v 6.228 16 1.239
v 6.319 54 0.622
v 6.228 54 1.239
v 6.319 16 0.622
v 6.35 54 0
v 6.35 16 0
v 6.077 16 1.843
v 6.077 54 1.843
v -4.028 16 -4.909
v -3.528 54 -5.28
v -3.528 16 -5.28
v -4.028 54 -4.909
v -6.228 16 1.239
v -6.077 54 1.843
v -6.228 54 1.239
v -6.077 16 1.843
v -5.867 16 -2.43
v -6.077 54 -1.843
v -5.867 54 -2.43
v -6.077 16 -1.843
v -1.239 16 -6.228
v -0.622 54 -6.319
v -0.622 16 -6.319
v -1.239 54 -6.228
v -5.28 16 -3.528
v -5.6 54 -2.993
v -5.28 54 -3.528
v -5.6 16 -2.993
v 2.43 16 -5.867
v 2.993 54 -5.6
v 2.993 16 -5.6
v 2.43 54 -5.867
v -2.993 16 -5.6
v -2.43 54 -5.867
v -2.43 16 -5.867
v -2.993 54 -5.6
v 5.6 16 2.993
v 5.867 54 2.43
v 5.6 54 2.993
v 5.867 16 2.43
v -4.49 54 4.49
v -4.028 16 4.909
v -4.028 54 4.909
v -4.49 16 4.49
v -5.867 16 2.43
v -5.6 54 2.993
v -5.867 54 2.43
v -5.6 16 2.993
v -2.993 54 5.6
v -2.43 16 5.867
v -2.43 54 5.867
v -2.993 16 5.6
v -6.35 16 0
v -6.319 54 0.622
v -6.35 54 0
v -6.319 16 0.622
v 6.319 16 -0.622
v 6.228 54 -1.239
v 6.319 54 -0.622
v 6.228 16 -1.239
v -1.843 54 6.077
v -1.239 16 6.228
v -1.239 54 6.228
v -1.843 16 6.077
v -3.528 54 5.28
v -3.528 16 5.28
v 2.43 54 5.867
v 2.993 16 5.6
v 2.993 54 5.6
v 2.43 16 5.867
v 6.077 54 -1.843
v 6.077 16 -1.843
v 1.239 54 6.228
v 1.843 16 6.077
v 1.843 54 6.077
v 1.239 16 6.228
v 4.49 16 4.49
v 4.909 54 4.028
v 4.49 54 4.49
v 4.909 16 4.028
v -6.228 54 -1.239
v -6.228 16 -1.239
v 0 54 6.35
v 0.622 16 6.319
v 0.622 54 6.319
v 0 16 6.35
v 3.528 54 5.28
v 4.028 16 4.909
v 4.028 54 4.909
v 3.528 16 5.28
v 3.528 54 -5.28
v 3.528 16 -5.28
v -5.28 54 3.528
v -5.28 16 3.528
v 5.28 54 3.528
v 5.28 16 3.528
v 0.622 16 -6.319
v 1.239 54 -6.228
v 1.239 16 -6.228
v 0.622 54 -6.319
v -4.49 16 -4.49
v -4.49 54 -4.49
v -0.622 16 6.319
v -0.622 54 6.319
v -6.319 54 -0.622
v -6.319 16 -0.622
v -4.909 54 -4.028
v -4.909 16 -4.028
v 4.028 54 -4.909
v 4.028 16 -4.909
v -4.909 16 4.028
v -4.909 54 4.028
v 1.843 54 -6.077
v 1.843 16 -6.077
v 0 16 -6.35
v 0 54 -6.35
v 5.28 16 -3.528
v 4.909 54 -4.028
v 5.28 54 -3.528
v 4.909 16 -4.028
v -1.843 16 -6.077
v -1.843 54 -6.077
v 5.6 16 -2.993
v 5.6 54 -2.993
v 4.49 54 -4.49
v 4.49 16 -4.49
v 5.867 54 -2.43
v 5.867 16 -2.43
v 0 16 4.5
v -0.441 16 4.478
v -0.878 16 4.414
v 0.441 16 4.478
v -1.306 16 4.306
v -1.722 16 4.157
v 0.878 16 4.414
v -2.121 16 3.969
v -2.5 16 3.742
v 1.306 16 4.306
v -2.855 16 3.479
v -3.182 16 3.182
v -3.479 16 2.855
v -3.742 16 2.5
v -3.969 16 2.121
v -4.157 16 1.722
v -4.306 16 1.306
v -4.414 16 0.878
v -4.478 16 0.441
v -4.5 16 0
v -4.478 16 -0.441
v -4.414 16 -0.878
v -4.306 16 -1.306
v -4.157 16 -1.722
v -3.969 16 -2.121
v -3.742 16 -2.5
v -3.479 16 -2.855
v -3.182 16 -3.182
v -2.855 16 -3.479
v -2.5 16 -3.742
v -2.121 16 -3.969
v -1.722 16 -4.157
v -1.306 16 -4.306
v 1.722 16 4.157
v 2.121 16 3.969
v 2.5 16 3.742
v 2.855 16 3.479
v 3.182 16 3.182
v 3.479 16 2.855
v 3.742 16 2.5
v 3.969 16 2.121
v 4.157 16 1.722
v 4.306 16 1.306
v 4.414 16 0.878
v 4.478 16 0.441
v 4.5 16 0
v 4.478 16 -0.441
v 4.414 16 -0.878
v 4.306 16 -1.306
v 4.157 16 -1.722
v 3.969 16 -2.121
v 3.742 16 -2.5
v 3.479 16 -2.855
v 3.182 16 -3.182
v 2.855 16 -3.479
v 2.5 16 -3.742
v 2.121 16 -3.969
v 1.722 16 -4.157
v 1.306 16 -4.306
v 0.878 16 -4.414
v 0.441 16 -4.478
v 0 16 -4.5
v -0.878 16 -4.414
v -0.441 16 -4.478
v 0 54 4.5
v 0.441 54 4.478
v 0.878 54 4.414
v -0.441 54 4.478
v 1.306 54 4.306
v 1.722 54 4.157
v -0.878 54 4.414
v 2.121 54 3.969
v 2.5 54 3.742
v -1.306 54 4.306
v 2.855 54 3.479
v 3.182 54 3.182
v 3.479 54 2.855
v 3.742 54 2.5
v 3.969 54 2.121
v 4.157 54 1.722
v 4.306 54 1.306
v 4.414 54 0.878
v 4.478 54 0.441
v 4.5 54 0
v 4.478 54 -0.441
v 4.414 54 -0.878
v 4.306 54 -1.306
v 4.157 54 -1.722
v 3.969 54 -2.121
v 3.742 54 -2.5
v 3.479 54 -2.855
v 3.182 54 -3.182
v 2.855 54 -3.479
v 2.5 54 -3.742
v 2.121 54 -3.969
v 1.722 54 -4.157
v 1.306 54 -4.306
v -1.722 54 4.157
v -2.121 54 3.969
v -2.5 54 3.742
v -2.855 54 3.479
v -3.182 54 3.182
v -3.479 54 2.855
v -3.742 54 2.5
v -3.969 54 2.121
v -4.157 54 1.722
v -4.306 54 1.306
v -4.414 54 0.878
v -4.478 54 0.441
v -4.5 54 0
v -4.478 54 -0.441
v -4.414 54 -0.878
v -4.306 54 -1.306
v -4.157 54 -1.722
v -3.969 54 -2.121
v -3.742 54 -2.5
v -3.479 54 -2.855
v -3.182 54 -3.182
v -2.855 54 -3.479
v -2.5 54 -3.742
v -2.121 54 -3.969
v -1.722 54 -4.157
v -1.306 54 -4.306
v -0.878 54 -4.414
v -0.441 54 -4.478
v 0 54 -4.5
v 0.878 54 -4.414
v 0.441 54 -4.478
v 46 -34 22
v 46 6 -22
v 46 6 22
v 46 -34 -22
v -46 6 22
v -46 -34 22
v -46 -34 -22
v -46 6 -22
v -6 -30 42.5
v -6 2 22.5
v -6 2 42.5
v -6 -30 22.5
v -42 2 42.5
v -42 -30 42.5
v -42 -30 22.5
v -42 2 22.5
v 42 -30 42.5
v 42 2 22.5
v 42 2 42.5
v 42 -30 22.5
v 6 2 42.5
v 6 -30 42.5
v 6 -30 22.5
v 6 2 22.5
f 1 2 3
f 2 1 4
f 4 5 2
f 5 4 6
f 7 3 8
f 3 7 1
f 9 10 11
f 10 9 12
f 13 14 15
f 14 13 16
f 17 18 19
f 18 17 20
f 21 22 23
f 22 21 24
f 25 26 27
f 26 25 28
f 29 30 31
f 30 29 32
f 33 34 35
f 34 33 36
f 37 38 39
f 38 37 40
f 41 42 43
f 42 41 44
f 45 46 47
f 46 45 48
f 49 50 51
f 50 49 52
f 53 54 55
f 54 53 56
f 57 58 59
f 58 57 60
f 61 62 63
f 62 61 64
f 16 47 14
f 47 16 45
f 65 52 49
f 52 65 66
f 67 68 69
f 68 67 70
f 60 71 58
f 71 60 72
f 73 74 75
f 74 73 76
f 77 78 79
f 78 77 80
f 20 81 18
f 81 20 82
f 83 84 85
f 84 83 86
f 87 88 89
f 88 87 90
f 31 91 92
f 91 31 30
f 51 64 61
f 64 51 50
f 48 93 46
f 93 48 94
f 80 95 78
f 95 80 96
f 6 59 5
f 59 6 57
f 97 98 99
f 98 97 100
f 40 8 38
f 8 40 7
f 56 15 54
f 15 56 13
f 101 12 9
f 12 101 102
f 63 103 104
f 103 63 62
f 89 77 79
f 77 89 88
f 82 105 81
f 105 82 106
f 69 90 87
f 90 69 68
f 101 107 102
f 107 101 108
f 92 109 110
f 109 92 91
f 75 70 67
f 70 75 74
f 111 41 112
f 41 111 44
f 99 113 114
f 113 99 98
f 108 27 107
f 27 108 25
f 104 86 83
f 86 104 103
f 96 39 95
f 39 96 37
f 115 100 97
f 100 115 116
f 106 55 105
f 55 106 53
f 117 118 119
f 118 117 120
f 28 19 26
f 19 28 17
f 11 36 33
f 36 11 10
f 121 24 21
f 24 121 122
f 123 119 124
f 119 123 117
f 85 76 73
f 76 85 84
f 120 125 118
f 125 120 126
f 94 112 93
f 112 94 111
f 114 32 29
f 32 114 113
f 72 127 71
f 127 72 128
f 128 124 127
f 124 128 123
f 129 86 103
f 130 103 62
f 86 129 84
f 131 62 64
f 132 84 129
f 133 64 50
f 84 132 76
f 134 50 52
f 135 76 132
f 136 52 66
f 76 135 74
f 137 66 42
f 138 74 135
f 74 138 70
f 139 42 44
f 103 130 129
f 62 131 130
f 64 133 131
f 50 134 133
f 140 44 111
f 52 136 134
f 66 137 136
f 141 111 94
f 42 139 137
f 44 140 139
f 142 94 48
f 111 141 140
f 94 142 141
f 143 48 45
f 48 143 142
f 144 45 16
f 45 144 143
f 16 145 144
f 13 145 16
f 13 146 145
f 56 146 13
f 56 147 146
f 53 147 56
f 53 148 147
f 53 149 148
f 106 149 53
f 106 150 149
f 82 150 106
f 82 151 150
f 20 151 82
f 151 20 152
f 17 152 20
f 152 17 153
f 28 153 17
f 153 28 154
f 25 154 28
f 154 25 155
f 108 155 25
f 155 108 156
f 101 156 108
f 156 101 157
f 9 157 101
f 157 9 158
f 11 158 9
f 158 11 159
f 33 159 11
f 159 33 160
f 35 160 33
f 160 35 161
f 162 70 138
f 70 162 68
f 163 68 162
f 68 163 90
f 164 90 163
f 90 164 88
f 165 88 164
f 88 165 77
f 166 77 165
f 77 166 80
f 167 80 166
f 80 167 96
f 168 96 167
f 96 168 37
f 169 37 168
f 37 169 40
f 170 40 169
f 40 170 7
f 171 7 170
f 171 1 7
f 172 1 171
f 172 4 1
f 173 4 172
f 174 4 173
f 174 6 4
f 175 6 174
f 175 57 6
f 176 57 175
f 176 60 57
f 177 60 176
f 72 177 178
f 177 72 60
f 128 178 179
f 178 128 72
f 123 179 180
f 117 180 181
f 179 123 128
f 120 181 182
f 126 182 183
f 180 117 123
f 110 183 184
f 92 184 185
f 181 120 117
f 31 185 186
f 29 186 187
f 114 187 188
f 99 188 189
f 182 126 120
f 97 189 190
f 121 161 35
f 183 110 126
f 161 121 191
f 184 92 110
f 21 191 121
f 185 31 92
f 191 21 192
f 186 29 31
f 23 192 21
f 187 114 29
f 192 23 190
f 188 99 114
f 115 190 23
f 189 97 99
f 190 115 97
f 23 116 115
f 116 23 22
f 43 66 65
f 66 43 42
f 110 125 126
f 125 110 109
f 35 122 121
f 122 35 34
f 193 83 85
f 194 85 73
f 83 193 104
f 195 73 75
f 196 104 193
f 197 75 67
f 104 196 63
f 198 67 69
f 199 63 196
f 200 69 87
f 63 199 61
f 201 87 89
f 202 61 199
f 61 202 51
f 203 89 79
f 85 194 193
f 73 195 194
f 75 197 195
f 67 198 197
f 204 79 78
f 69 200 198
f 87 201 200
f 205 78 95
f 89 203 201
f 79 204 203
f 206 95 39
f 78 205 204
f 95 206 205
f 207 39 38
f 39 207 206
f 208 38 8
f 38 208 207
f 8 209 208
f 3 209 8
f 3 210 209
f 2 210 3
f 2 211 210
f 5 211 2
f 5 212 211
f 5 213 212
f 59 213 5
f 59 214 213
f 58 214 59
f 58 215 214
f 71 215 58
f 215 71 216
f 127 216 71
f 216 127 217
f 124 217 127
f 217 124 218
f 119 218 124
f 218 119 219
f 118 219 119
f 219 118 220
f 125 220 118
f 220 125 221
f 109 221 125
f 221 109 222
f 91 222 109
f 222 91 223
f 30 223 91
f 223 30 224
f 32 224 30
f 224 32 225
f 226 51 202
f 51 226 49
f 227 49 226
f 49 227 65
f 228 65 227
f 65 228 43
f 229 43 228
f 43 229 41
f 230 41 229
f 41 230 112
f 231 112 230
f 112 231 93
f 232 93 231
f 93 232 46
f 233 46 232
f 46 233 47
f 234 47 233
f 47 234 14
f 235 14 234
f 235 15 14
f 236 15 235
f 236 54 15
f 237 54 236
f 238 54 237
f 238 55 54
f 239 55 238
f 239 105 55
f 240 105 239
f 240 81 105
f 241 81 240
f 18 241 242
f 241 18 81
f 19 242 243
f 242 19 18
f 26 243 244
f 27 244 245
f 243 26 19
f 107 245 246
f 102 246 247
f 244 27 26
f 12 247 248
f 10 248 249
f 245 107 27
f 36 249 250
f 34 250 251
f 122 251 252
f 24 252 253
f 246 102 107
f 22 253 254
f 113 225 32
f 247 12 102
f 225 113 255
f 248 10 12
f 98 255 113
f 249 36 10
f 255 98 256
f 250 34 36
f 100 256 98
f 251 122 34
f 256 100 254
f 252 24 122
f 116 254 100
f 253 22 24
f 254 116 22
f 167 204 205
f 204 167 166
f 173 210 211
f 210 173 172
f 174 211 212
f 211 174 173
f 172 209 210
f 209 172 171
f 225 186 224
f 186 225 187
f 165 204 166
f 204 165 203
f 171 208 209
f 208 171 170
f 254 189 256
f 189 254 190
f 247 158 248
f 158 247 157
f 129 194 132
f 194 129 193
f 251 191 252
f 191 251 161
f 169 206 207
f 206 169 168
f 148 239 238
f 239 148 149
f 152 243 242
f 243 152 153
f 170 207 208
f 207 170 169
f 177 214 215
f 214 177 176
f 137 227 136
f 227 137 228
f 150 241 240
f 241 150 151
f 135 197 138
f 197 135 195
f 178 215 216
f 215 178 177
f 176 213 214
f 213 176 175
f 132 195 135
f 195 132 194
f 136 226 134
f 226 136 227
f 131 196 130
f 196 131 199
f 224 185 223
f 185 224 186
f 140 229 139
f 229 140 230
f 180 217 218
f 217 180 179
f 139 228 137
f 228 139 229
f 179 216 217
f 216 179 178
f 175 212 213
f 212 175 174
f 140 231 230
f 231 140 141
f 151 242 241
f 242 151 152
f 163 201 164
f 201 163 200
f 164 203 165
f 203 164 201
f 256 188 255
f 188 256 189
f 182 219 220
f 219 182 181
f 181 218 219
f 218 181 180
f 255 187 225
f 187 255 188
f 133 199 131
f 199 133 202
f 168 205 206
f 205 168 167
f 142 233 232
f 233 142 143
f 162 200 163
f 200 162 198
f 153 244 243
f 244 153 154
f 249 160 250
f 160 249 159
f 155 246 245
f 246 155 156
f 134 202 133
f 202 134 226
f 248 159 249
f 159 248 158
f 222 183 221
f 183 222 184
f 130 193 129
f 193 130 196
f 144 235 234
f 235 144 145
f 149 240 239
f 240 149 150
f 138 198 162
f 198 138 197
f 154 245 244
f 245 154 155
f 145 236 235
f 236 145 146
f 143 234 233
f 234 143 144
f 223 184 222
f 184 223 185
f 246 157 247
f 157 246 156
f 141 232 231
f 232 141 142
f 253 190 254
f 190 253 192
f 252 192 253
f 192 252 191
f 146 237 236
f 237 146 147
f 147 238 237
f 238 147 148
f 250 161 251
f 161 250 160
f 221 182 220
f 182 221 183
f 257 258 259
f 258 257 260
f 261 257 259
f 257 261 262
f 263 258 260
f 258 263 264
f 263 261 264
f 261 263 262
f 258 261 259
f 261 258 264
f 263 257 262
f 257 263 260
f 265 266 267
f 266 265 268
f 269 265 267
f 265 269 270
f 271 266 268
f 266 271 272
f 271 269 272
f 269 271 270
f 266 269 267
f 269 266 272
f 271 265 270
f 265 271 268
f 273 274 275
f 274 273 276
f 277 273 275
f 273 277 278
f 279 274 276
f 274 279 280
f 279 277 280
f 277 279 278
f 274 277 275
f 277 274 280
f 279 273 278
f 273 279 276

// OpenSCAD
// ============================================================================
// Atom Lithography Machine — Parametric OpenSCAD Module (S1.1-04)
// ============================================================================
// part_id           : S1.1-04
// parent_bom_id     : S1.1
// subsystem         : S1
// part_name         : UHV VCR kutle akis denetleyici ve kaynak gaz manifoldu
// material          : 316L
// temp_stage        : 300 K
// vacuum_grade      : UHV 1e-9 mbar
// tolerance         : ±1% FS akis
// computed_mass_kg  : 1.67892
// envelope_mm       : 92.000 x 105.250 x 67.000
// design_maturity   : M0_M1_DETAILED_CAD_DESIGN_ONLY
// no_lab_measurement: true
// iec61508_certified: false
// semi_s2_certified : false
// Units: millimeters (mm)
// ============================================================================

$fn = 64;

// Nominal bounding envelope parameters (mm)
bbox_x = 92.0000;
bbox_y = 105.2500;
bbox_z = 67.0000;

// Part-specific parametric dimensions
manifold_w = 92.0;
manifold_d = 40.0;
vcr_od = 12.7;

// Interface / port parameters (mm)
port_vcr_out_to_source_od = 12.700;
port_vcr_out_to_source_bore = 9.000;
port_vcr_in_from_cabinet_od = 9.500;
port_vcr_in_from_cabinet_bore = 6.400;

module part_S1_1_04() {
  union() {
    // 316L VAR VCR manifold block
    translate([0.000, -14.000, 0.000]) cube([92.000, 40.000, 44.000], center=true);
    // PH3 0.1-10 sccm MFC
    translate([-24.000, -14.000, 32.500]) cube([36.000, 32.000, 20.000], center=true);
    // SiF4 0.1-10 sccm MFC
    translate([24.000, -14.000, 32.500]) cube([36.000, 32.000, 20.000], center=true);
    // Coaxial VCR feed tube to S1.1-01
    translate([0.000, 35.000, 0.000]) rotate([90.000, 0.000, 0.000]) {
      difference() {
        cylinder(d=12.700, h=38.000, center=true);
        cylinder(d=9.000, h=40.000, center=true);
      }
    }
  }
}

// World assembly mounting transform (global machine frame, mm / deg):
// translate([0.000, -102.000, 492.660]) rotate([0.000, 0.000, 0.000]) part_S1_1_04();

part_S1_1_04();
